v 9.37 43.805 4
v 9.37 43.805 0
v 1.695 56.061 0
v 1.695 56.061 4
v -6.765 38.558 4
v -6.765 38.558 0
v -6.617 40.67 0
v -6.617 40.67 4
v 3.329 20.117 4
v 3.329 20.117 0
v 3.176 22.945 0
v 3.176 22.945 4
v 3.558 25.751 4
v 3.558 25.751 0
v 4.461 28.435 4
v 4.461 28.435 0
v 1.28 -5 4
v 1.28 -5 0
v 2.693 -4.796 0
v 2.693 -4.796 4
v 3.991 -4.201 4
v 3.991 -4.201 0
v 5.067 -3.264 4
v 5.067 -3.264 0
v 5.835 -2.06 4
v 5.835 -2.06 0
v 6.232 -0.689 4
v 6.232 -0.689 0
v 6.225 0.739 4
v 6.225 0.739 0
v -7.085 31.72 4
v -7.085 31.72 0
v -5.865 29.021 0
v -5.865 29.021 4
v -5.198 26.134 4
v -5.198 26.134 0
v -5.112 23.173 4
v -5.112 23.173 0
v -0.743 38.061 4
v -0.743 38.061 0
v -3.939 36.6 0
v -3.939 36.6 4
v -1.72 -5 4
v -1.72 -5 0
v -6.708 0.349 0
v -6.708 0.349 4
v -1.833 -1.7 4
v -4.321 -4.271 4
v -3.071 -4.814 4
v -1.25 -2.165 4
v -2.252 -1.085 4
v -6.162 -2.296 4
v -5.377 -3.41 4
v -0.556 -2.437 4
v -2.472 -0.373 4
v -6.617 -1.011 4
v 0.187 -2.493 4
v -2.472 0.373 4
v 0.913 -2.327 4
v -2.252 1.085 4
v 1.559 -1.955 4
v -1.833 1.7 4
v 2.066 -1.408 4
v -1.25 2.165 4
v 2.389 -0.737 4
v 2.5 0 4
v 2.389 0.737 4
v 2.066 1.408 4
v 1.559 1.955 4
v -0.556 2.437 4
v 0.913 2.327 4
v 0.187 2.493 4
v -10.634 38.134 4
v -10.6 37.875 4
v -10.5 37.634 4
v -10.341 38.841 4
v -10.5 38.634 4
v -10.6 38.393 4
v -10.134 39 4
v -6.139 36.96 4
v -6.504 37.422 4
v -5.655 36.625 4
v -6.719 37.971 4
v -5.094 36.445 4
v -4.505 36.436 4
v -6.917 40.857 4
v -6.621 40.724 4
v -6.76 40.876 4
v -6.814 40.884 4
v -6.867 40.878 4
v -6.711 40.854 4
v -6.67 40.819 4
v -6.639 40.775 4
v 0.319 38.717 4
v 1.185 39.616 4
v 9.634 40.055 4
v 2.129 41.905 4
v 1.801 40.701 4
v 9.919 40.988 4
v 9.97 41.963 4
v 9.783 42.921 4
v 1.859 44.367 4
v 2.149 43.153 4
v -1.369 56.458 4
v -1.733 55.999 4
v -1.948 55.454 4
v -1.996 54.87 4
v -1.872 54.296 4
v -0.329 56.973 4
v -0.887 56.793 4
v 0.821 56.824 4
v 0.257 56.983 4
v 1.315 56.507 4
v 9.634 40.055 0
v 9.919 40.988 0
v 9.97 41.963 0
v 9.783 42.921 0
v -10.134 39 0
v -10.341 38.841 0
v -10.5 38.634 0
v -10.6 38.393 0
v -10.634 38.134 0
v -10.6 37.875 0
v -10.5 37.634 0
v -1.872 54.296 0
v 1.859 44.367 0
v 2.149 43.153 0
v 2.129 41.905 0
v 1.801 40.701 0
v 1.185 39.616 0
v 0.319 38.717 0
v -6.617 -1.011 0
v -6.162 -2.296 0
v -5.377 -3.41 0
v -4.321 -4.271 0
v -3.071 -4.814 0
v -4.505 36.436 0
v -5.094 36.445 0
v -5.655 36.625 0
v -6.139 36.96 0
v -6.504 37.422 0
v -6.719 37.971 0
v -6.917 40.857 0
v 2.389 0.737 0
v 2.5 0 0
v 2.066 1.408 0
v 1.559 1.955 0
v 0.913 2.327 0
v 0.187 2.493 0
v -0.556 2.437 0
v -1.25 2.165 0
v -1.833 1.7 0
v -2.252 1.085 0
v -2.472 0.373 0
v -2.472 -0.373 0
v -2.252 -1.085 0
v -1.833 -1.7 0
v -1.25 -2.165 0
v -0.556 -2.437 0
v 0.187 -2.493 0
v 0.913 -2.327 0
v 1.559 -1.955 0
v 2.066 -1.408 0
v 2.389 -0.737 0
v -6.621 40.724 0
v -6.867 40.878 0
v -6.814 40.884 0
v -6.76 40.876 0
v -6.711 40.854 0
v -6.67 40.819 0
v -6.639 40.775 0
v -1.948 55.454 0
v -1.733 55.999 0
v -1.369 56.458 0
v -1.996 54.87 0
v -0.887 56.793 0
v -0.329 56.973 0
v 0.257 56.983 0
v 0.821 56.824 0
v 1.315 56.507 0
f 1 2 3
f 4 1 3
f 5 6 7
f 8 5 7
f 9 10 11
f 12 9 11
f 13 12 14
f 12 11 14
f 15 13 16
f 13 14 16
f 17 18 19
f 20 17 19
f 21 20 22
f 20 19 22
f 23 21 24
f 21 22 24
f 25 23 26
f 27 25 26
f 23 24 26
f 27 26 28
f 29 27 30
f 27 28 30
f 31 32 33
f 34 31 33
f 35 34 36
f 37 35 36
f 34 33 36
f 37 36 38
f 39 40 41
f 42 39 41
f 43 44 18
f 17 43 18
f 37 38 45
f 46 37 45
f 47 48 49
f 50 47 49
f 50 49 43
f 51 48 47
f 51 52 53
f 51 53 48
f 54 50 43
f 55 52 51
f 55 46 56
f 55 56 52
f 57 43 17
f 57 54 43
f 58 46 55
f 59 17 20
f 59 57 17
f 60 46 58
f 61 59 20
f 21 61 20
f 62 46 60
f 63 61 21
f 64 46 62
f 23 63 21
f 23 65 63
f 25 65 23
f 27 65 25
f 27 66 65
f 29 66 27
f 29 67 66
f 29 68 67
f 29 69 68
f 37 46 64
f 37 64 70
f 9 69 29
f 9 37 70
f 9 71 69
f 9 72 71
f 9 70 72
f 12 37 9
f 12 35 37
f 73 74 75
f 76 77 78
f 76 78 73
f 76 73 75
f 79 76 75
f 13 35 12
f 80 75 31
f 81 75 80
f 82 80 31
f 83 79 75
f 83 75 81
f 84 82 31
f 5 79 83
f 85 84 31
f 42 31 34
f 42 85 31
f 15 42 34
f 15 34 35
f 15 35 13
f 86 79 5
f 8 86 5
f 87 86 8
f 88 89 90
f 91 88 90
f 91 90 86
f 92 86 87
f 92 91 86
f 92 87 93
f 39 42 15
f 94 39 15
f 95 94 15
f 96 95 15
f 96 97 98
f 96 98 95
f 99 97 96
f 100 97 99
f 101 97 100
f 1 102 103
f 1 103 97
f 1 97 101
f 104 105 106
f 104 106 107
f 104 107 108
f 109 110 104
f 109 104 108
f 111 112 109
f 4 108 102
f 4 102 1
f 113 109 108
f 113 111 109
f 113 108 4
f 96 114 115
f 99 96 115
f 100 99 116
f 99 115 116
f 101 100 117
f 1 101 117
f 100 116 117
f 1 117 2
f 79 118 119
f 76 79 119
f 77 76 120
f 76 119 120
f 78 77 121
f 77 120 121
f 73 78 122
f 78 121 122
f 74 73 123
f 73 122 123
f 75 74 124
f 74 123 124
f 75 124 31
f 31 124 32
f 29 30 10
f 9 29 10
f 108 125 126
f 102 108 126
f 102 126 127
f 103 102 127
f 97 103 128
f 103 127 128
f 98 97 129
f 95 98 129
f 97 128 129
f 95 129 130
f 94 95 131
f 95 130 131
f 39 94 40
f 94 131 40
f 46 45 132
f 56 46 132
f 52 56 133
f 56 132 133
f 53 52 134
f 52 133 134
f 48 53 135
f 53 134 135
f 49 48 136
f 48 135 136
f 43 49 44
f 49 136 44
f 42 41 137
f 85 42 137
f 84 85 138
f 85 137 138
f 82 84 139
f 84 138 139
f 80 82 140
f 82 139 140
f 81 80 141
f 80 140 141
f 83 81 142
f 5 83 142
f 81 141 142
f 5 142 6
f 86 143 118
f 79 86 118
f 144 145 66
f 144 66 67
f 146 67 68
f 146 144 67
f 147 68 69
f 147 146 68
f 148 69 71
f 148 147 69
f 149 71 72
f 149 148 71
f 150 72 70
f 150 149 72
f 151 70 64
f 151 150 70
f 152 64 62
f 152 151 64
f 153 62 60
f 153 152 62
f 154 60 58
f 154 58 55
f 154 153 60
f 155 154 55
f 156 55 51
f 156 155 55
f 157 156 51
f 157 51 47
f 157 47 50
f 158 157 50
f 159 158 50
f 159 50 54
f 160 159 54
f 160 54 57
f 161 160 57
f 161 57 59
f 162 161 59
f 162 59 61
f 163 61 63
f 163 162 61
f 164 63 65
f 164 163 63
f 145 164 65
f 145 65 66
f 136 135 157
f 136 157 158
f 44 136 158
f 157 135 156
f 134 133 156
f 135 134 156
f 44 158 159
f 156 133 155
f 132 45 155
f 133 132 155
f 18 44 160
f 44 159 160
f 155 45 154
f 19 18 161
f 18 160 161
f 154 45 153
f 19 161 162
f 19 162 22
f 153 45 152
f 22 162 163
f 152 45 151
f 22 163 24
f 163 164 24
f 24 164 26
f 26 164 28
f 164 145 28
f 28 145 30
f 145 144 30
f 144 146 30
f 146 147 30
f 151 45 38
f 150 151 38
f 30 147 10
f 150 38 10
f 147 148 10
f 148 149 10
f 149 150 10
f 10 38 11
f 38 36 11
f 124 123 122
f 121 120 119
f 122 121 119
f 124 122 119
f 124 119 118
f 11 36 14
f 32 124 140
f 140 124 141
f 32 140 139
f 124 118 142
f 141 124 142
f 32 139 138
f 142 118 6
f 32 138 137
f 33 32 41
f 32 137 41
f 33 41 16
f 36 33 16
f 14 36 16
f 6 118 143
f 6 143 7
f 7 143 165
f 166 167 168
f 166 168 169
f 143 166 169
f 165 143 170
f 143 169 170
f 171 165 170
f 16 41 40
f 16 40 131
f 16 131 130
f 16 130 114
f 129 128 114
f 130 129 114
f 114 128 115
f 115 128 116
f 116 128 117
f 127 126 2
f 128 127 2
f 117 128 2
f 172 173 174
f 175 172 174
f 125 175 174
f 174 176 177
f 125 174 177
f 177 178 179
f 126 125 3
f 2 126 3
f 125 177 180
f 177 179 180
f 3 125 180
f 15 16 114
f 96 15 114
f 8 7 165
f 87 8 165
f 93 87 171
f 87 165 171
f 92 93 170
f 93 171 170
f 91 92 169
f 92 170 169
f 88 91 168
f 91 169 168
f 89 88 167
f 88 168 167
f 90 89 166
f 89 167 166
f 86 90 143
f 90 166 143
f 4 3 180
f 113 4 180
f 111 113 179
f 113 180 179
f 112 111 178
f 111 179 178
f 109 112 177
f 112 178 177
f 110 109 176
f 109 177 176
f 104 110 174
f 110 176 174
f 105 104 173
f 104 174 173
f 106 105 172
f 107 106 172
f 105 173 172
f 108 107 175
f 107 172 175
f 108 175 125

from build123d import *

# Parameters (mm, degrees)
SKIZZE1_R               = 2.5
LINEAR_AUSTRAGEN1_DEPTH = 4


with BuildPart() as part:
    # Skizze1 → Linear austragen1 (new body)
    with BuildSketch(Plane.XY):
        with BuildLine():
            Line((-1.720471048, -5), (1.279528952, -5))
            ThreePointArc((1.279528952, -5), (5.067353874, -3.263798762), (6.224608269, 0.739047056))
            Line((6.224608269, 0.739047056), (3.328540718, 20.117087516))
            ThreePointArc((3.328540718, 20.117087516), (3.300790208, 24.356992637), (4.460596804, 28.435278329))
            Line((4.460596804, 28.435278329), (9.633958573, 40.054839106))
            ThreePointArc((9.633958573, 40.054839106), (9.969901697, 41.962682181), (9.36998022, 43.804642334))
            Line((9.36998022, 43.804642334), (1.695101739, 56.061428328))
            ThreePointArc((1.695101739, 56.061428328), (-0.886899712, 56.792598366), (-1.872184322, 54.296490325))
            Line((-1.872184322, 54.296490325), (1.85912682, 44.36670191))
            ThreePointArc((1.85912682, 44.36670191), (1.800761722, 40.701037253), (-0.742535185, 38.060555344))
            Line((-0.742535185, 38.060555344), (-3.938539061, 36.599525001))
            ThreePointArc((-3.938539061, 36.599525001), (-5.909088644, 36.774512117), (-6.765186682, 38.5579869))
            Line((-6.765186682, 38.5579869), (-6.617488885, 40.670163795))
            ThreePointArc((-6.617488885, 40.670163795), (-6.711017842, 40.853724709), (-6.917001695, 40.85732017))
            Line((-6.917001695, 40.85732017), (-10.133974596, 39))
            ThreePointArc((-10.133974596, 39), (-10.599900423, 38.392793641), (-10.5, 37.633974596))
            Line((-10.5, 37.633974596), (-7.085329154, 31.719591199))
            ThreePointArc((-7.085329154, 31.719591199), (-5.460159239, 27.593857014), (-5.112249457, 23.173244093))
            Line((-5.112249457, 23.173244093), (-6.708291299, 0.348782369))
            ThreePointArc((-6.708291299, 0.348782369), (-5.377239556, -3.4099918), (-1.720471048, -5))
        make_face()
        Circle(SKIZZE1_R, mode=Mode.SUBTRACT)
    extrude(amount=LINEAR_AUSTRAGEN1_DEPTH)


solid = part.part
